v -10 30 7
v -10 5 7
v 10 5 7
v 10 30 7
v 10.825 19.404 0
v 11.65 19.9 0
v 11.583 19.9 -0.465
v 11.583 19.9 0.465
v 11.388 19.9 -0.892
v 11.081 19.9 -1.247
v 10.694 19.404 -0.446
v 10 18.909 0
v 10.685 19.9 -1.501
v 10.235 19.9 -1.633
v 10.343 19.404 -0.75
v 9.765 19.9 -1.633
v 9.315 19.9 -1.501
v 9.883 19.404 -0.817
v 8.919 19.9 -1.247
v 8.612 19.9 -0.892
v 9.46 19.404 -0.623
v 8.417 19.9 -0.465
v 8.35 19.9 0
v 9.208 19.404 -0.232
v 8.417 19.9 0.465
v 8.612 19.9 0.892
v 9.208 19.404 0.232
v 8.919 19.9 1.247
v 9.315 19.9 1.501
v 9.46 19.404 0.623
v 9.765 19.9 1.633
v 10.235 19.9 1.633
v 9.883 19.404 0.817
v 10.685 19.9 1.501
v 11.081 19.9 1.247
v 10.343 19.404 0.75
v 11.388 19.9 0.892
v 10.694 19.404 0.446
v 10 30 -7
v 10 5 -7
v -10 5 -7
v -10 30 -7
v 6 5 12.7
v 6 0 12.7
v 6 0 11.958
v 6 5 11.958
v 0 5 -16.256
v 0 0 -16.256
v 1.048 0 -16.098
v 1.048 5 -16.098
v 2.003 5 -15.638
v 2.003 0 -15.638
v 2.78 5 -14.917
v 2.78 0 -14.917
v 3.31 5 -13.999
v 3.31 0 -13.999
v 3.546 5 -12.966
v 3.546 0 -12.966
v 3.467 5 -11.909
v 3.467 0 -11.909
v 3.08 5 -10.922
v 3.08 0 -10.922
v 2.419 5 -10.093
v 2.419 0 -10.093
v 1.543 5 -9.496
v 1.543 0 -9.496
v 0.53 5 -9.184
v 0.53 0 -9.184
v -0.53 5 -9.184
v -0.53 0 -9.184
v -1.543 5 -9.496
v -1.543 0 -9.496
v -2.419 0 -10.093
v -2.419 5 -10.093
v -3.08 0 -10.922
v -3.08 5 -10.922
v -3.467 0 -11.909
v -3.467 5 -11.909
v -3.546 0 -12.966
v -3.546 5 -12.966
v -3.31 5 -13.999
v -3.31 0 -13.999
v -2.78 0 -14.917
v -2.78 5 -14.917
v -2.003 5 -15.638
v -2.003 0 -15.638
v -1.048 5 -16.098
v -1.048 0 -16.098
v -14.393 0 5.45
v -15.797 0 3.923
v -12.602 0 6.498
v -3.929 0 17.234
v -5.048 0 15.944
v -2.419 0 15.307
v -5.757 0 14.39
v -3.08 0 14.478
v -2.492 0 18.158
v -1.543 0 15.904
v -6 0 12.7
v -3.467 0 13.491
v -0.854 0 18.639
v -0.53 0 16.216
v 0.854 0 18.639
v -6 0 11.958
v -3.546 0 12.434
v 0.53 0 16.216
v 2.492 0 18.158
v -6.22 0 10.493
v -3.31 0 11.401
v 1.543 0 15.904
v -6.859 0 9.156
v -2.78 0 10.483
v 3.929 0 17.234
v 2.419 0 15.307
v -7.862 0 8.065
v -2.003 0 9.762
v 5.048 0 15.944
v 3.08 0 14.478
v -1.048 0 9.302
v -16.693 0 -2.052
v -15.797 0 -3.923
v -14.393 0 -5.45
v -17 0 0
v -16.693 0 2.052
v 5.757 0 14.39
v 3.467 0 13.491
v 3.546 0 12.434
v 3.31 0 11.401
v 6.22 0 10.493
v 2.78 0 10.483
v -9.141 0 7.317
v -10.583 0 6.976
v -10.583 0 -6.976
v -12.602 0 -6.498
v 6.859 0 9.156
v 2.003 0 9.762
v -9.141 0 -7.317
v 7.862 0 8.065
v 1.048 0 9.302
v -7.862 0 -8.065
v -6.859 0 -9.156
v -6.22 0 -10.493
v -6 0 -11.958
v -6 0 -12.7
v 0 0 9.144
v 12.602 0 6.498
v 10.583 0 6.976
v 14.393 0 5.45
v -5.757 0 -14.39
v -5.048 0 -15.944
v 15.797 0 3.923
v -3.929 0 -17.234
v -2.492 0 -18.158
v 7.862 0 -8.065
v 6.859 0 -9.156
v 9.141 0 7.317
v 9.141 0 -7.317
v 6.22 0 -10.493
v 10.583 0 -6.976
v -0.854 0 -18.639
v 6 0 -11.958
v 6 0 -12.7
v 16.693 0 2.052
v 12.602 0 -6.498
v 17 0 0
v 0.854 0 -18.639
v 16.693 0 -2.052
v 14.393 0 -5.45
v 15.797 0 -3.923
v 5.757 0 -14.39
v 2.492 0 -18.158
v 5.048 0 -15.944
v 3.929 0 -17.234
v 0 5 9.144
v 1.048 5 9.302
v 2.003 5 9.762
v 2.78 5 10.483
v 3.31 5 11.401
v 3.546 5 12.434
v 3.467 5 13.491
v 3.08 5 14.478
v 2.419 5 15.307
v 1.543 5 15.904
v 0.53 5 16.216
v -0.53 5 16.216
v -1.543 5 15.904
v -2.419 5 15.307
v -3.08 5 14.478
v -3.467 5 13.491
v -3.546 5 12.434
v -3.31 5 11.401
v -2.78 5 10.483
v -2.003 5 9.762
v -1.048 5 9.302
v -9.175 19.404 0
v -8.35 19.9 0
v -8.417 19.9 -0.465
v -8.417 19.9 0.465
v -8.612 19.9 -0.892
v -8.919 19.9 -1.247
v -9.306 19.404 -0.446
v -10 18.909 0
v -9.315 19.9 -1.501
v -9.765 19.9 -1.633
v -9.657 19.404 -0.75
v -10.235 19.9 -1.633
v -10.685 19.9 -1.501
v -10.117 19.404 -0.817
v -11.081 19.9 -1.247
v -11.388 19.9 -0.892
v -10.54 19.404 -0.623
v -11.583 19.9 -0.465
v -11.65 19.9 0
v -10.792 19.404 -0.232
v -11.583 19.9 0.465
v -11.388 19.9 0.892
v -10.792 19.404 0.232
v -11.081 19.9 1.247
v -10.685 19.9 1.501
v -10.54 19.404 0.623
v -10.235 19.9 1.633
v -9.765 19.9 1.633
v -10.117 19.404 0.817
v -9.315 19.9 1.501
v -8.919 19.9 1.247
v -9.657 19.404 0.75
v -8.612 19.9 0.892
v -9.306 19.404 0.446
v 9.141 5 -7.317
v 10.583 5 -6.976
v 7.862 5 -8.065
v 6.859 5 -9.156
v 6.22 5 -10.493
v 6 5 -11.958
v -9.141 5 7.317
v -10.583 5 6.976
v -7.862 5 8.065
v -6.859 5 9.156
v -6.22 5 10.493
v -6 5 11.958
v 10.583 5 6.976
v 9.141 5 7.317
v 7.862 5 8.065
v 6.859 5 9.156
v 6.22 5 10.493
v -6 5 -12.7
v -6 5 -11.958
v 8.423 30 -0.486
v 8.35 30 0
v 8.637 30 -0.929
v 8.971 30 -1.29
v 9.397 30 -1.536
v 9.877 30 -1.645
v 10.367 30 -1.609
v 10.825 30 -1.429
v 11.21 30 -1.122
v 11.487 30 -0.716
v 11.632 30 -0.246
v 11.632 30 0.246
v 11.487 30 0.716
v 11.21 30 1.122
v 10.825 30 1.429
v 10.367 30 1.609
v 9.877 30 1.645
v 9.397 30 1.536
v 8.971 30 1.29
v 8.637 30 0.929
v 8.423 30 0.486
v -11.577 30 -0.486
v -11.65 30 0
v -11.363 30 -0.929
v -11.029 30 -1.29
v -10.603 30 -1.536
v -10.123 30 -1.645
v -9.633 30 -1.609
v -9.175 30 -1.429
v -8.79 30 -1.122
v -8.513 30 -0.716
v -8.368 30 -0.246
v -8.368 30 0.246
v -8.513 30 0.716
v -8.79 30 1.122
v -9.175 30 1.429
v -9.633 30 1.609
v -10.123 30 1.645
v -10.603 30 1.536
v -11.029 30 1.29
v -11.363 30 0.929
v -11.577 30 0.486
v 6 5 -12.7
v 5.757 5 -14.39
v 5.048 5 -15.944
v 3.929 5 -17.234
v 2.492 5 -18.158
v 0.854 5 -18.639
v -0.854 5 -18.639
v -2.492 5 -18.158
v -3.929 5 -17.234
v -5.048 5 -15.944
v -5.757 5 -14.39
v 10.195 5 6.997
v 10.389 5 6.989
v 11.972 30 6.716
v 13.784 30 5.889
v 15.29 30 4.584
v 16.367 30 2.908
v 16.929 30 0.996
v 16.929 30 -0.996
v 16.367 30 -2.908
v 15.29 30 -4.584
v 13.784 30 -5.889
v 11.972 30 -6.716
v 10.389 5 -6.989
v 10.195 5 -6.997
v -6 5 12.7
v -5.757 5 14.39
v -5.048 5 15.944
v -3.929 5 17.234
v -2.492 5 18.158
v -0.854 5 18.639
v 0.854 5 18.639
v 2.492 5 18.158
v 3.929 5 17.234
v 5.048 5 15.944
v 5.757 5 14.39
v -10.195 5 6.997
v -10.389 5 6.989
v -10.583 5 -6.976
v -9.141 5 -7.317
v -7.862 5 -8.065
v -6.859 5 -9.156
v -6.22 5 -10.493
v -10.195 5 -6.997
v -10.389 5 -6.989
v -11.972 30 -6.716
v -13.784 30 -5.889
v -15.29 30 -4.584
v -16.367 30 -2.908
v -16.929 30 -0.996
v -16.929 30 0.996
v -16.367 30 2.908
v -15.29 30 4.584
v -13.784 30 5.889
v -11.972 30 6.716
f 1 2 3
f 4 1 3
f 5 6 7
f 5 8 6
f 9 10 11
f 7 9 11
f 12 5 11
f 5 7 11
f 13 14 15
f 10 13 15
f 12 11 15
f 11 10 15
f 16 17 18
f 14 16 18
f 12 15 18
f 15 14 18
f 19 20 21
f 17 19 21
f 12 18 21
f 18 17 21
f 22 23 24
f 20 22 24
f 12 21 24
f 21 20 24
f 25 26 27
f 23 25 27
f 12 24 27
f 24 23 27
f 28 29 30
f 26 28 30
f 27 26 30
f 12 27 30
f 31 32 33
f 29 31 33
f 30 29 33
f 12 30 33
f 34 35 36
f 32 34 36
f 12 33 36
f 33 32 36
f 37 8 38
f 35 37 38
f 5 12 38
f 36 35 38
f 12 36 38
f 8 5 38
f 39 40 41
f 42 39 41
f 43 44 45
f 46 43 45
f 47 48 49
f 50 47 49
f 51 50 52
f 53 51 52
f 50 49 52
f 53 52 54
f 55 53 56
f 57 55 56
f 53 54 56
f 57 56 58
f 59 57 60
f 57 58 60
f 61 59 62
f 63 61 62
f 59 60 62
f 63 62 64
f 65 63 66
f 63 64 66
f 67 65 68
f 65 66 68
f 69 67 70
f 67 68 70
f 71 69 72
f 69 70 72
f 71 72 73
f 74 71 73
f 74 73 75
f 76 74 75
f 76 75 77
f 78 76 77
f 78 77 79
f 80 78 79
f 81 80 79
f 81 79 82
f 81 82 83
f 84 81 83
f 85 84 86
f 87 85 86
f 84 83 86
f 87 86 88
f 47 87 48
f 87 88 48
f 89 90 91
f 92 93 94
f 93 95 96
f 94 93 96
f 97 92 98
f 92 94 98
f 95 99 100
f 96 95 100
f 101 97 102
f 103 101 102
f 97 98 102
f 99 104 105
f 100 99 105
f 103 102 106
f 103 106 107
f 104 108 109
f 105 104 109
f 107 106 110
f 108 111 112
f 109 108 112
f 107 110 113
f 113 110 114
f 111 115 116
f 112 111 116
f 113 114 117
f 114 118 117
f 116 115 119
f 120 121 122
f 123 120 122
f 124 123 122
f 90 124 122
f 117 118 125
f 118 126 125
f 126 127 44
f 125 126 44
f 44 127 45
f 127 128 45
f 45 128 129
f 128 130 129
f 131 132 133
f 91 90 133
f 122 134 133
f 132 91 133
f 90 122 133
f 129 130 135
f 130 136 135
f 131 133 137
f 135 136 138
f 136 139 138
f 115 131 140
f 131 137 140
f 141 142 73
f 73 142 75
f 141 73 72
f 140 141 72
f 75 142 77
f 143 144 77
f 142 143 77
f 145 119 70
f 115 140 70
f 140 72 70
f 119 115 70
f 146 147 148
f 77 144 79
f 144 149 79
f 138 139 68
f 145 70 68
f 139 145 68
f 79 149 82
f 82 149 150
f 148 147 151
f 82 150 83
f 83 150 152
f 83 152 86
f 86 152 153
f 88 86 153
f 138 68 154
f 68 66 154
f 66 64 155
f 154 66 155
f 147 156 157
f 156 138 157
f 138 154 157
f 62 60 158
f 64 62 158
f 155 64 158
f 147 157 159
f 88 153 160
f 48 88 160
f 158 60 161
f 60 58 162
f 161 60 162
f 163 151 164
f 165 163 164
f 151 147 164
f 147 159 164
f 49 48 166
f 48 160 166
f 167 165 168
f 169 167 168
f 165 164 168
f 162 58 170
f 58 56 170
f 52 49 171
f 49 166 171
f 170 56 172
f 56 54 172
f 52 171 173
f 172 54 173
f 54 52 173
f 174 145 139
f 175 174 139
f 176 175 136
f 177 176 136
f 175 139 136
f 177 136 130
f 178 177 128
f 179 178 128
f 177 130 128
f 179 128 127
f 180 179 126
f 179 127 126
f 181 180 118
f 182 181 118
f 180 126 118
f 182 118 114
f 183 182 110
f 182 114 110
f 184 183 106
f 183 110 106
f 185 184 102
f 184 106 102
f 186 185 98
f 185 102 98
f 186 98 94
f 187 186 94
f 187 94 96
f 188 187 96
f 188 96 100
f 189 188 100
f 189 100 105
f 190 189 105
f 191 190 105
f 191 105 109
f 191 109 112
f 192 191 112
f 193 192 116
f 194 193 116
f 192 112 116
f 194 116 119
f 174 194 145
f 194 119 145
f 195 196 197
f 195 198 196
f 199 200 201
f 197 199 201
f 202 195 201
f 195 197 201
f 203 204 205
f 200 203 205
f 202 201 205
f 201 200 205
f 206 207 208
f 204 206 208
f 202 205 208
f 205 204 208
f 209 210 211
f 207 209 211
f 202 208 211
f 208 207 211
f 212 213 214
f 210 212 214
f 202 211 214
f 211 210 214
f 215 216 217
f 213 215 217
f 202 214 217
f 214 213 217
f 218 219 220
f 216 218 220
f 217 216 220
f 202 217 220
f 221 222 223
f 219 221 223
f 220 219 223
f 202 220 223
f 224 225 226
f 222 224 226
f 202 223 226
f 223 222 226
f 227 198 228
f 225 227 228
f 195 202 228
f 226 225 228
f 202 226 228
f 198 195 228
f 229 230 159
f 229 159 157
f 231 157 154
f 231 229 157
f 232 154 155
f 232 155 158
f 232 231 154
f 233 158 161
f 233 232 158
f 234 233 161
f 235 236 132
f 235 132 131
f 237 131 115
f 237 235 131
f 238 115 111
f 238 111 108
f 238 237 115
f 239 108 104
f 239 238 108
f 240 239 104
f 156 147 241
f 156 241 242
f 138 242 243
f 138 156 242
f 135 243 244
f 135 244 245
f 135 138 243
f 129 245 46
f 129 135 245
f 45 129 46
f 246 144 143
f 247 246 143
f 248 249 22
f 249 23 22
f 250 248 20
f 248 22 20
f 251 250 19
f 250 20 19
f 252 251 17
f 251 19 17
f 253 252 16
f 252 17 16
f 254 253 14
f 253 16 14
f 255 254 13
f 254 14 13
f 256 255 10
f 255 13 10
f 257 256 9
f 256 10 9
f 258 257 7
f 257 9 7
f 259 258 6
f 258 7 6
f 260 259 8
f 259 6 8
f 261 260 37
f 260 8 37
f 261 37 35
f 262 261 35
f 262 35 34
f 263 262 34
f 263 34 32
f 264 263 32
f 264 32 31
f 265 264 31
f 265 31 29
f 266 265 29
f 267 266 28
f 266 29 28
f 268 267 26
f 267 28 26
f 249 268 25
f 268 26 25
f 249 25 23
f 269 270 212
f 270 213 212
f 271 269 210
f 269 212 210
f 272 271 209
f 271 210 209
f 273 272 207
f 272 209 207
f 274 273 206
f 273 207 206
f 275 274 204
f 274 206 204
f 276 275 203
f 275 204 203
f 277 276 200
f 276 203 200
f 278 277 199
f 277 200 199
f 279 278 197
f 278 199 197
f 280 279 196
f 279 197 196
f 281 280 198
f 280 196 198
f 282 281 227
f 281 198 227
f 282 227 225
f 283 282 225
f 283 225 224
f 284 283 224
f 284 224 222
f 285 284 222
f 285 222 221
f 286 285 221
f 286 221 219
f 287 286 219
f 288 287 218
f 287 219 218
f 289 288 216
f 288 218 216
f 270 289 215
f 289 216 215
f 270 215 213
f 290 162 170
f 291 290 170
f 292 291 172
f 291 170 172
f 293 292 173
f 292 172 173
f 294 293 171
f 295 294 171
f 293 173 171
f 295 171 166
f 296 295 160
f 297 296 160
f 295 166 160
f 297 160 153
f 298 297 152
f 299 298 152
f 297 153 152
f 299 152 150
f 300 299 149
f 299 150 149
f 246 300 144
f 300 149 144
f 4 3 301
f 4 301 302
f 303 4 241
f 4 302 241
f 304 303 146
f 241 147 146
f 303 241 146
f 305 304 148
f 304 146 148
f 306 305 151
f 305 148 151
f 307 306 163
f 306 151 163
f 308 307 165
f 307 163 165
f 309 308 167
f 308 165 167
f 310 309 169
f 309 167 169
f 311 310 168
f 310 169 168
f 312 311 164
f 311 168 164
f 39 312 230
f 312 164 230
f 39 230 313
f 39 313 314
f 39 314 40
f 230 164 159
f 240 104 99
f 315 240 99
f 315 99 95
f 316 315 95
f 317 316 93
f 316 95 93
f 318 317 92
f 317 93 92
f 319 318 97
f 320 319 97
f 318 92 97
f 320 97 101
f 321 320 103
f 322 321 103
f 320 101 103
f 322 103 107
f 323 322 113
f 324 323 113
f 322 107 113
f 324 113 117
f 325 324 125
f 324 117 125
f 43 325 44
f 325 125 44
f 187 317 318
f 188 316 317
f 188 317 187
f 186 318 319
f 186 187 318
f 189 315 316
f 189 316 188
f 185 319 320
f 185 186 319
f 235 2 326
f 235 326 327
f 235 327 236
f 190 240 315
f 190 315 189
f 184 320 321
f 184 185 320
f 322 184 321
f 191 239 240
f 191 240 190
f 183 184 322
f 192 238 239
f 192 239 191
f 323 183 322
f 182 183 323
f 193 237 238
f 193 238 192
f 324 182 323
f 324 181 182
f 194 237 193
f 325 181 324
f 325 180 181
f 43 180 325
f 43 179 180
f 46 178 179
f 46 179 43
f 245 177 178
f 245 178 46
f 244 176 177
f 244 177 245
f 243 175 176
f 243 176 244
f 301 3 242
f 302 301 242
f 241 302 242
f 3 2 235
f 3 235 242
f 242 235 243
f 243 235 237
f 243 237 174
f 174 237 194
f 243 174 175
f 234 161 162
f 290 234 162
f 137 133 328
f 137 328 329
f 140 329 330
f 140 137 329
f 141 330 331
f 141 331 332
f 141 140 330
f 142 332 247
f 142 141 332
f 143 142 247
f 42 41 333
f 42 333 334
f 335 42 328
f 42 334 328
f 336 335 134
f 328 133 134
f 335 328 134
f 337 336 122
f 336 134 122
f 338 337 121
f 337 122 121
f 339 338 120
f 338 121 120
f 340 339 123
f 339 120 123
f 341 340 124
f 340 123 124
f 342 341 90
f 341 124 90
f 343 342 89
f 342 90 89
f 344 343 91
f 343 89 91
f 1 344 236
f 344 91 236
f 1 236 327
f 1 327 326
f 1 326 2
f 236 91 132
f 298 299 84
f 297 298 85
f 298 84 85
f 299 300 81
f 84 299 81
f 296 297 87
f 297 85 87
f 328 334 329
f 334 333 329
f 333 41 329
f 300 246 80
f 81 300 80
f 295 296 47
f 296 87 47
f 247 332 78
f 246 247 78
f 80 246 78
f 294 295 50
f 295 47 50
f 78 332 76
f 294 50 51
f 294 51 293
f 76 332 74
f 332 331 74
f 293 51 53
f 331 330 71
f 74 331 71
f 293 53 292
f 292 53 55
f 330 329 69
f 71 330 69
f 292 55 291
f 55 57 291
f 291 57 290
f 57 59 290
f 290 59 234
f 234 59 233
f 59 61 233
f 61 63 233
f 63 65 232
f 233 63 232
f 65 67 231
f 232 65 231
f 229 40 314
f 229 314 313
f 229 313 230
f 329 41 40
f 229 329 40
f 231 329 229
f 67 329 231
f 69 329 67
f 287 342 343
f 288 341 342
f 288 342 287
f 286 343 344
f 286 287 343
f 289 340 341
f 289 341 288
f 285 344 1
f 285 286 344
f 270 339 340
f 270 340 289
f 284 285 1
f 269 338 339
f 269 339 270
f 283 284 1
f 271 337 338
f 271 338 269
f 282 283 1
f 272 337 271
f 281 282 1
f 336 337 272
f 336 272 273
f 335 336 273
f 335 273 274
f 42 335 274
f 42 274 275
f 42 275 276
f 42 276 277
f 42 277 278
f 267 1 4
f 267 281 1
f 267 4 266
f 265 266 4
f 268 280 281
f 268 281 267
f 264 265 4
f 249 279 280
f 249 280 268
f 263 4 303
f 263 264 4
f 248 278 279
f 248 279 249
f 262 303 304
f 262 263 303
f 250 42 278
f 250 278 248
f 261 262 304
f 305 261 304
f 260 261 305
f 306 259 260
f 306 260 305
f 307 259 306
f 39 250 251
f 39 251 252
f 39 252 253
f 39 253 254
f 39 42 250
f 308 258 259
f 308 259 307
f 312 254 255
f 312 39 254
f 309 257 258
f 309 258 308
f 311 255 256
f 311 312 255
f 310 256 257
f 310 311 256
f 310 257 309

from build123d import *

# Parameters (mm, degrees)
BOSS_EXTRUDE1_DEPTH       = 30
M4X0_7_TAPPED_HOLE1_D     = 3.3
M4X0_7_TAPPED_HOLE1_DEPTH = 10.1
M4X0_7_TAPPED_HOLE1_TIP   = 0.991420021
SKETCH4_R                 = 3.556
BOSS_EXTRUDE2_DEPTH       = 5
FILLET1_R                 = 5


with BuildPart() as part:
    # Sketch1 → Boss-Extrude1 (new body)
    with BuildSketch(Plane(origin=(0, 0, 0), x_dir=(1, 0, 0), z_dir=(0, 1, 0))):
        with BuildLine():
            Line((-10, -7), (10, -7))
            ThreePointArc((10, -7), (17, 0), (10, 7))
            Line((10, 7), (-10, 7))
            ThreePointArc((-10, 7), (-17, 0), (-10, -7))
        make_face()
    extrude(amount=BOSS_EXTRUDE1_DEPTH)

    # M4x0.7 Tapped Hole1
    with Locations(Plane(origin=(0, 30, 0), x_dir=(1, 0, 0), z_dir=(0, 1, 0))):
        with Locations((-10, 0), (10, 0)):
            Hole(M4X0_7_TAPPED_HOLE1_D / 2, depth=M4X0_7_TAPPED_HOLE1_DEPTH)
            with Locations((0, 0, -(M4X0_7_TAPPED_HOLE1_DEPTH + M4X0_7_TAPPED_HOLE1_TIP / 2))):  # 118° drill point
                Cone(0, M4X0_7_TAPPED_HOLE1_D / 2, M4X0_7_TAPPED_HOLE1_TIP, mode=Mode.SUBTRACT)

    # Sketch4 → Boss-Extrude2 (add)
    with BuildSketch(Plane.XZ):
        with BuildLine():
            Line((6, 12.7), (6, -12.7))
            ThreePointArc((6, -12.7), (0, -18.7), (-6, -12.7))
            Line((-6, -12.7), (-6, 12.7))
            ThreePointArc((-6, 12.7), (0, 18.7), (6, 12.7))
        make_face()
        with Locations(Location((0, 12.7, 0), (0, 0, 270))):
            Circle(SKETCH4_R, mode=Mode.SUBTRACT)
        with Locations(Location((0, -12.7, 0), (0, 0, 270))):
            Circle(SKETCH4_R, mode=Mode.SUBTRACT)
    extrude(amount=-BOSS_EXTRUDE2_DEPTH)

    # Fillet1
    # the kernel refuses this fillet: 5 mm, written as the material it adds along each edge
    with BuildSketch(Plane(origin=(-6, 5, 7), x_dir=(-0.9999858901973535, 0, -0.0053121941047544466), z_dir=(0, -1, 0)), Plane(origin=(-6, 0, -7), x_dir=(-0.9999858901973535, 0, 0.005312194104754061), z_dir=(0, 1, 0)), Plane(origin=(6, 5, -7), x_dir=(0.9999858901973535, 0, 0.005312194104753284), z_dir=(0, -1, 0)), Plane(origin=(6, 0, 7), x_dir=(0.9999858901973535, 0, -0.0053121941047534794), z_dir=(0, 1, 0))) as fillet1_piece_1:
        with BuildLine():
            CenterArc((4.973590207, -4.984751754), FILLET1_R, 94.475824114, 85.219808153)
            Line((-0.026339243, -4.958190783), (-0.526332189, -4.955534686))
            Line((-0.526332189, -4.955534686), (-0.499992945, 0.002656097))
            Line((-0.499992945, 0.002656097), (0.002656097, 0.499992945))
            ThreePointArc((0.002656097, 0.499992945), (4.002599658, 0.478744169), (4.544378784, 0.498475175))
            Line((4.544378784, 0.498475175), (4.583398004, 0))
        make_face()
    extrude(amount=5)


solid = part.part
